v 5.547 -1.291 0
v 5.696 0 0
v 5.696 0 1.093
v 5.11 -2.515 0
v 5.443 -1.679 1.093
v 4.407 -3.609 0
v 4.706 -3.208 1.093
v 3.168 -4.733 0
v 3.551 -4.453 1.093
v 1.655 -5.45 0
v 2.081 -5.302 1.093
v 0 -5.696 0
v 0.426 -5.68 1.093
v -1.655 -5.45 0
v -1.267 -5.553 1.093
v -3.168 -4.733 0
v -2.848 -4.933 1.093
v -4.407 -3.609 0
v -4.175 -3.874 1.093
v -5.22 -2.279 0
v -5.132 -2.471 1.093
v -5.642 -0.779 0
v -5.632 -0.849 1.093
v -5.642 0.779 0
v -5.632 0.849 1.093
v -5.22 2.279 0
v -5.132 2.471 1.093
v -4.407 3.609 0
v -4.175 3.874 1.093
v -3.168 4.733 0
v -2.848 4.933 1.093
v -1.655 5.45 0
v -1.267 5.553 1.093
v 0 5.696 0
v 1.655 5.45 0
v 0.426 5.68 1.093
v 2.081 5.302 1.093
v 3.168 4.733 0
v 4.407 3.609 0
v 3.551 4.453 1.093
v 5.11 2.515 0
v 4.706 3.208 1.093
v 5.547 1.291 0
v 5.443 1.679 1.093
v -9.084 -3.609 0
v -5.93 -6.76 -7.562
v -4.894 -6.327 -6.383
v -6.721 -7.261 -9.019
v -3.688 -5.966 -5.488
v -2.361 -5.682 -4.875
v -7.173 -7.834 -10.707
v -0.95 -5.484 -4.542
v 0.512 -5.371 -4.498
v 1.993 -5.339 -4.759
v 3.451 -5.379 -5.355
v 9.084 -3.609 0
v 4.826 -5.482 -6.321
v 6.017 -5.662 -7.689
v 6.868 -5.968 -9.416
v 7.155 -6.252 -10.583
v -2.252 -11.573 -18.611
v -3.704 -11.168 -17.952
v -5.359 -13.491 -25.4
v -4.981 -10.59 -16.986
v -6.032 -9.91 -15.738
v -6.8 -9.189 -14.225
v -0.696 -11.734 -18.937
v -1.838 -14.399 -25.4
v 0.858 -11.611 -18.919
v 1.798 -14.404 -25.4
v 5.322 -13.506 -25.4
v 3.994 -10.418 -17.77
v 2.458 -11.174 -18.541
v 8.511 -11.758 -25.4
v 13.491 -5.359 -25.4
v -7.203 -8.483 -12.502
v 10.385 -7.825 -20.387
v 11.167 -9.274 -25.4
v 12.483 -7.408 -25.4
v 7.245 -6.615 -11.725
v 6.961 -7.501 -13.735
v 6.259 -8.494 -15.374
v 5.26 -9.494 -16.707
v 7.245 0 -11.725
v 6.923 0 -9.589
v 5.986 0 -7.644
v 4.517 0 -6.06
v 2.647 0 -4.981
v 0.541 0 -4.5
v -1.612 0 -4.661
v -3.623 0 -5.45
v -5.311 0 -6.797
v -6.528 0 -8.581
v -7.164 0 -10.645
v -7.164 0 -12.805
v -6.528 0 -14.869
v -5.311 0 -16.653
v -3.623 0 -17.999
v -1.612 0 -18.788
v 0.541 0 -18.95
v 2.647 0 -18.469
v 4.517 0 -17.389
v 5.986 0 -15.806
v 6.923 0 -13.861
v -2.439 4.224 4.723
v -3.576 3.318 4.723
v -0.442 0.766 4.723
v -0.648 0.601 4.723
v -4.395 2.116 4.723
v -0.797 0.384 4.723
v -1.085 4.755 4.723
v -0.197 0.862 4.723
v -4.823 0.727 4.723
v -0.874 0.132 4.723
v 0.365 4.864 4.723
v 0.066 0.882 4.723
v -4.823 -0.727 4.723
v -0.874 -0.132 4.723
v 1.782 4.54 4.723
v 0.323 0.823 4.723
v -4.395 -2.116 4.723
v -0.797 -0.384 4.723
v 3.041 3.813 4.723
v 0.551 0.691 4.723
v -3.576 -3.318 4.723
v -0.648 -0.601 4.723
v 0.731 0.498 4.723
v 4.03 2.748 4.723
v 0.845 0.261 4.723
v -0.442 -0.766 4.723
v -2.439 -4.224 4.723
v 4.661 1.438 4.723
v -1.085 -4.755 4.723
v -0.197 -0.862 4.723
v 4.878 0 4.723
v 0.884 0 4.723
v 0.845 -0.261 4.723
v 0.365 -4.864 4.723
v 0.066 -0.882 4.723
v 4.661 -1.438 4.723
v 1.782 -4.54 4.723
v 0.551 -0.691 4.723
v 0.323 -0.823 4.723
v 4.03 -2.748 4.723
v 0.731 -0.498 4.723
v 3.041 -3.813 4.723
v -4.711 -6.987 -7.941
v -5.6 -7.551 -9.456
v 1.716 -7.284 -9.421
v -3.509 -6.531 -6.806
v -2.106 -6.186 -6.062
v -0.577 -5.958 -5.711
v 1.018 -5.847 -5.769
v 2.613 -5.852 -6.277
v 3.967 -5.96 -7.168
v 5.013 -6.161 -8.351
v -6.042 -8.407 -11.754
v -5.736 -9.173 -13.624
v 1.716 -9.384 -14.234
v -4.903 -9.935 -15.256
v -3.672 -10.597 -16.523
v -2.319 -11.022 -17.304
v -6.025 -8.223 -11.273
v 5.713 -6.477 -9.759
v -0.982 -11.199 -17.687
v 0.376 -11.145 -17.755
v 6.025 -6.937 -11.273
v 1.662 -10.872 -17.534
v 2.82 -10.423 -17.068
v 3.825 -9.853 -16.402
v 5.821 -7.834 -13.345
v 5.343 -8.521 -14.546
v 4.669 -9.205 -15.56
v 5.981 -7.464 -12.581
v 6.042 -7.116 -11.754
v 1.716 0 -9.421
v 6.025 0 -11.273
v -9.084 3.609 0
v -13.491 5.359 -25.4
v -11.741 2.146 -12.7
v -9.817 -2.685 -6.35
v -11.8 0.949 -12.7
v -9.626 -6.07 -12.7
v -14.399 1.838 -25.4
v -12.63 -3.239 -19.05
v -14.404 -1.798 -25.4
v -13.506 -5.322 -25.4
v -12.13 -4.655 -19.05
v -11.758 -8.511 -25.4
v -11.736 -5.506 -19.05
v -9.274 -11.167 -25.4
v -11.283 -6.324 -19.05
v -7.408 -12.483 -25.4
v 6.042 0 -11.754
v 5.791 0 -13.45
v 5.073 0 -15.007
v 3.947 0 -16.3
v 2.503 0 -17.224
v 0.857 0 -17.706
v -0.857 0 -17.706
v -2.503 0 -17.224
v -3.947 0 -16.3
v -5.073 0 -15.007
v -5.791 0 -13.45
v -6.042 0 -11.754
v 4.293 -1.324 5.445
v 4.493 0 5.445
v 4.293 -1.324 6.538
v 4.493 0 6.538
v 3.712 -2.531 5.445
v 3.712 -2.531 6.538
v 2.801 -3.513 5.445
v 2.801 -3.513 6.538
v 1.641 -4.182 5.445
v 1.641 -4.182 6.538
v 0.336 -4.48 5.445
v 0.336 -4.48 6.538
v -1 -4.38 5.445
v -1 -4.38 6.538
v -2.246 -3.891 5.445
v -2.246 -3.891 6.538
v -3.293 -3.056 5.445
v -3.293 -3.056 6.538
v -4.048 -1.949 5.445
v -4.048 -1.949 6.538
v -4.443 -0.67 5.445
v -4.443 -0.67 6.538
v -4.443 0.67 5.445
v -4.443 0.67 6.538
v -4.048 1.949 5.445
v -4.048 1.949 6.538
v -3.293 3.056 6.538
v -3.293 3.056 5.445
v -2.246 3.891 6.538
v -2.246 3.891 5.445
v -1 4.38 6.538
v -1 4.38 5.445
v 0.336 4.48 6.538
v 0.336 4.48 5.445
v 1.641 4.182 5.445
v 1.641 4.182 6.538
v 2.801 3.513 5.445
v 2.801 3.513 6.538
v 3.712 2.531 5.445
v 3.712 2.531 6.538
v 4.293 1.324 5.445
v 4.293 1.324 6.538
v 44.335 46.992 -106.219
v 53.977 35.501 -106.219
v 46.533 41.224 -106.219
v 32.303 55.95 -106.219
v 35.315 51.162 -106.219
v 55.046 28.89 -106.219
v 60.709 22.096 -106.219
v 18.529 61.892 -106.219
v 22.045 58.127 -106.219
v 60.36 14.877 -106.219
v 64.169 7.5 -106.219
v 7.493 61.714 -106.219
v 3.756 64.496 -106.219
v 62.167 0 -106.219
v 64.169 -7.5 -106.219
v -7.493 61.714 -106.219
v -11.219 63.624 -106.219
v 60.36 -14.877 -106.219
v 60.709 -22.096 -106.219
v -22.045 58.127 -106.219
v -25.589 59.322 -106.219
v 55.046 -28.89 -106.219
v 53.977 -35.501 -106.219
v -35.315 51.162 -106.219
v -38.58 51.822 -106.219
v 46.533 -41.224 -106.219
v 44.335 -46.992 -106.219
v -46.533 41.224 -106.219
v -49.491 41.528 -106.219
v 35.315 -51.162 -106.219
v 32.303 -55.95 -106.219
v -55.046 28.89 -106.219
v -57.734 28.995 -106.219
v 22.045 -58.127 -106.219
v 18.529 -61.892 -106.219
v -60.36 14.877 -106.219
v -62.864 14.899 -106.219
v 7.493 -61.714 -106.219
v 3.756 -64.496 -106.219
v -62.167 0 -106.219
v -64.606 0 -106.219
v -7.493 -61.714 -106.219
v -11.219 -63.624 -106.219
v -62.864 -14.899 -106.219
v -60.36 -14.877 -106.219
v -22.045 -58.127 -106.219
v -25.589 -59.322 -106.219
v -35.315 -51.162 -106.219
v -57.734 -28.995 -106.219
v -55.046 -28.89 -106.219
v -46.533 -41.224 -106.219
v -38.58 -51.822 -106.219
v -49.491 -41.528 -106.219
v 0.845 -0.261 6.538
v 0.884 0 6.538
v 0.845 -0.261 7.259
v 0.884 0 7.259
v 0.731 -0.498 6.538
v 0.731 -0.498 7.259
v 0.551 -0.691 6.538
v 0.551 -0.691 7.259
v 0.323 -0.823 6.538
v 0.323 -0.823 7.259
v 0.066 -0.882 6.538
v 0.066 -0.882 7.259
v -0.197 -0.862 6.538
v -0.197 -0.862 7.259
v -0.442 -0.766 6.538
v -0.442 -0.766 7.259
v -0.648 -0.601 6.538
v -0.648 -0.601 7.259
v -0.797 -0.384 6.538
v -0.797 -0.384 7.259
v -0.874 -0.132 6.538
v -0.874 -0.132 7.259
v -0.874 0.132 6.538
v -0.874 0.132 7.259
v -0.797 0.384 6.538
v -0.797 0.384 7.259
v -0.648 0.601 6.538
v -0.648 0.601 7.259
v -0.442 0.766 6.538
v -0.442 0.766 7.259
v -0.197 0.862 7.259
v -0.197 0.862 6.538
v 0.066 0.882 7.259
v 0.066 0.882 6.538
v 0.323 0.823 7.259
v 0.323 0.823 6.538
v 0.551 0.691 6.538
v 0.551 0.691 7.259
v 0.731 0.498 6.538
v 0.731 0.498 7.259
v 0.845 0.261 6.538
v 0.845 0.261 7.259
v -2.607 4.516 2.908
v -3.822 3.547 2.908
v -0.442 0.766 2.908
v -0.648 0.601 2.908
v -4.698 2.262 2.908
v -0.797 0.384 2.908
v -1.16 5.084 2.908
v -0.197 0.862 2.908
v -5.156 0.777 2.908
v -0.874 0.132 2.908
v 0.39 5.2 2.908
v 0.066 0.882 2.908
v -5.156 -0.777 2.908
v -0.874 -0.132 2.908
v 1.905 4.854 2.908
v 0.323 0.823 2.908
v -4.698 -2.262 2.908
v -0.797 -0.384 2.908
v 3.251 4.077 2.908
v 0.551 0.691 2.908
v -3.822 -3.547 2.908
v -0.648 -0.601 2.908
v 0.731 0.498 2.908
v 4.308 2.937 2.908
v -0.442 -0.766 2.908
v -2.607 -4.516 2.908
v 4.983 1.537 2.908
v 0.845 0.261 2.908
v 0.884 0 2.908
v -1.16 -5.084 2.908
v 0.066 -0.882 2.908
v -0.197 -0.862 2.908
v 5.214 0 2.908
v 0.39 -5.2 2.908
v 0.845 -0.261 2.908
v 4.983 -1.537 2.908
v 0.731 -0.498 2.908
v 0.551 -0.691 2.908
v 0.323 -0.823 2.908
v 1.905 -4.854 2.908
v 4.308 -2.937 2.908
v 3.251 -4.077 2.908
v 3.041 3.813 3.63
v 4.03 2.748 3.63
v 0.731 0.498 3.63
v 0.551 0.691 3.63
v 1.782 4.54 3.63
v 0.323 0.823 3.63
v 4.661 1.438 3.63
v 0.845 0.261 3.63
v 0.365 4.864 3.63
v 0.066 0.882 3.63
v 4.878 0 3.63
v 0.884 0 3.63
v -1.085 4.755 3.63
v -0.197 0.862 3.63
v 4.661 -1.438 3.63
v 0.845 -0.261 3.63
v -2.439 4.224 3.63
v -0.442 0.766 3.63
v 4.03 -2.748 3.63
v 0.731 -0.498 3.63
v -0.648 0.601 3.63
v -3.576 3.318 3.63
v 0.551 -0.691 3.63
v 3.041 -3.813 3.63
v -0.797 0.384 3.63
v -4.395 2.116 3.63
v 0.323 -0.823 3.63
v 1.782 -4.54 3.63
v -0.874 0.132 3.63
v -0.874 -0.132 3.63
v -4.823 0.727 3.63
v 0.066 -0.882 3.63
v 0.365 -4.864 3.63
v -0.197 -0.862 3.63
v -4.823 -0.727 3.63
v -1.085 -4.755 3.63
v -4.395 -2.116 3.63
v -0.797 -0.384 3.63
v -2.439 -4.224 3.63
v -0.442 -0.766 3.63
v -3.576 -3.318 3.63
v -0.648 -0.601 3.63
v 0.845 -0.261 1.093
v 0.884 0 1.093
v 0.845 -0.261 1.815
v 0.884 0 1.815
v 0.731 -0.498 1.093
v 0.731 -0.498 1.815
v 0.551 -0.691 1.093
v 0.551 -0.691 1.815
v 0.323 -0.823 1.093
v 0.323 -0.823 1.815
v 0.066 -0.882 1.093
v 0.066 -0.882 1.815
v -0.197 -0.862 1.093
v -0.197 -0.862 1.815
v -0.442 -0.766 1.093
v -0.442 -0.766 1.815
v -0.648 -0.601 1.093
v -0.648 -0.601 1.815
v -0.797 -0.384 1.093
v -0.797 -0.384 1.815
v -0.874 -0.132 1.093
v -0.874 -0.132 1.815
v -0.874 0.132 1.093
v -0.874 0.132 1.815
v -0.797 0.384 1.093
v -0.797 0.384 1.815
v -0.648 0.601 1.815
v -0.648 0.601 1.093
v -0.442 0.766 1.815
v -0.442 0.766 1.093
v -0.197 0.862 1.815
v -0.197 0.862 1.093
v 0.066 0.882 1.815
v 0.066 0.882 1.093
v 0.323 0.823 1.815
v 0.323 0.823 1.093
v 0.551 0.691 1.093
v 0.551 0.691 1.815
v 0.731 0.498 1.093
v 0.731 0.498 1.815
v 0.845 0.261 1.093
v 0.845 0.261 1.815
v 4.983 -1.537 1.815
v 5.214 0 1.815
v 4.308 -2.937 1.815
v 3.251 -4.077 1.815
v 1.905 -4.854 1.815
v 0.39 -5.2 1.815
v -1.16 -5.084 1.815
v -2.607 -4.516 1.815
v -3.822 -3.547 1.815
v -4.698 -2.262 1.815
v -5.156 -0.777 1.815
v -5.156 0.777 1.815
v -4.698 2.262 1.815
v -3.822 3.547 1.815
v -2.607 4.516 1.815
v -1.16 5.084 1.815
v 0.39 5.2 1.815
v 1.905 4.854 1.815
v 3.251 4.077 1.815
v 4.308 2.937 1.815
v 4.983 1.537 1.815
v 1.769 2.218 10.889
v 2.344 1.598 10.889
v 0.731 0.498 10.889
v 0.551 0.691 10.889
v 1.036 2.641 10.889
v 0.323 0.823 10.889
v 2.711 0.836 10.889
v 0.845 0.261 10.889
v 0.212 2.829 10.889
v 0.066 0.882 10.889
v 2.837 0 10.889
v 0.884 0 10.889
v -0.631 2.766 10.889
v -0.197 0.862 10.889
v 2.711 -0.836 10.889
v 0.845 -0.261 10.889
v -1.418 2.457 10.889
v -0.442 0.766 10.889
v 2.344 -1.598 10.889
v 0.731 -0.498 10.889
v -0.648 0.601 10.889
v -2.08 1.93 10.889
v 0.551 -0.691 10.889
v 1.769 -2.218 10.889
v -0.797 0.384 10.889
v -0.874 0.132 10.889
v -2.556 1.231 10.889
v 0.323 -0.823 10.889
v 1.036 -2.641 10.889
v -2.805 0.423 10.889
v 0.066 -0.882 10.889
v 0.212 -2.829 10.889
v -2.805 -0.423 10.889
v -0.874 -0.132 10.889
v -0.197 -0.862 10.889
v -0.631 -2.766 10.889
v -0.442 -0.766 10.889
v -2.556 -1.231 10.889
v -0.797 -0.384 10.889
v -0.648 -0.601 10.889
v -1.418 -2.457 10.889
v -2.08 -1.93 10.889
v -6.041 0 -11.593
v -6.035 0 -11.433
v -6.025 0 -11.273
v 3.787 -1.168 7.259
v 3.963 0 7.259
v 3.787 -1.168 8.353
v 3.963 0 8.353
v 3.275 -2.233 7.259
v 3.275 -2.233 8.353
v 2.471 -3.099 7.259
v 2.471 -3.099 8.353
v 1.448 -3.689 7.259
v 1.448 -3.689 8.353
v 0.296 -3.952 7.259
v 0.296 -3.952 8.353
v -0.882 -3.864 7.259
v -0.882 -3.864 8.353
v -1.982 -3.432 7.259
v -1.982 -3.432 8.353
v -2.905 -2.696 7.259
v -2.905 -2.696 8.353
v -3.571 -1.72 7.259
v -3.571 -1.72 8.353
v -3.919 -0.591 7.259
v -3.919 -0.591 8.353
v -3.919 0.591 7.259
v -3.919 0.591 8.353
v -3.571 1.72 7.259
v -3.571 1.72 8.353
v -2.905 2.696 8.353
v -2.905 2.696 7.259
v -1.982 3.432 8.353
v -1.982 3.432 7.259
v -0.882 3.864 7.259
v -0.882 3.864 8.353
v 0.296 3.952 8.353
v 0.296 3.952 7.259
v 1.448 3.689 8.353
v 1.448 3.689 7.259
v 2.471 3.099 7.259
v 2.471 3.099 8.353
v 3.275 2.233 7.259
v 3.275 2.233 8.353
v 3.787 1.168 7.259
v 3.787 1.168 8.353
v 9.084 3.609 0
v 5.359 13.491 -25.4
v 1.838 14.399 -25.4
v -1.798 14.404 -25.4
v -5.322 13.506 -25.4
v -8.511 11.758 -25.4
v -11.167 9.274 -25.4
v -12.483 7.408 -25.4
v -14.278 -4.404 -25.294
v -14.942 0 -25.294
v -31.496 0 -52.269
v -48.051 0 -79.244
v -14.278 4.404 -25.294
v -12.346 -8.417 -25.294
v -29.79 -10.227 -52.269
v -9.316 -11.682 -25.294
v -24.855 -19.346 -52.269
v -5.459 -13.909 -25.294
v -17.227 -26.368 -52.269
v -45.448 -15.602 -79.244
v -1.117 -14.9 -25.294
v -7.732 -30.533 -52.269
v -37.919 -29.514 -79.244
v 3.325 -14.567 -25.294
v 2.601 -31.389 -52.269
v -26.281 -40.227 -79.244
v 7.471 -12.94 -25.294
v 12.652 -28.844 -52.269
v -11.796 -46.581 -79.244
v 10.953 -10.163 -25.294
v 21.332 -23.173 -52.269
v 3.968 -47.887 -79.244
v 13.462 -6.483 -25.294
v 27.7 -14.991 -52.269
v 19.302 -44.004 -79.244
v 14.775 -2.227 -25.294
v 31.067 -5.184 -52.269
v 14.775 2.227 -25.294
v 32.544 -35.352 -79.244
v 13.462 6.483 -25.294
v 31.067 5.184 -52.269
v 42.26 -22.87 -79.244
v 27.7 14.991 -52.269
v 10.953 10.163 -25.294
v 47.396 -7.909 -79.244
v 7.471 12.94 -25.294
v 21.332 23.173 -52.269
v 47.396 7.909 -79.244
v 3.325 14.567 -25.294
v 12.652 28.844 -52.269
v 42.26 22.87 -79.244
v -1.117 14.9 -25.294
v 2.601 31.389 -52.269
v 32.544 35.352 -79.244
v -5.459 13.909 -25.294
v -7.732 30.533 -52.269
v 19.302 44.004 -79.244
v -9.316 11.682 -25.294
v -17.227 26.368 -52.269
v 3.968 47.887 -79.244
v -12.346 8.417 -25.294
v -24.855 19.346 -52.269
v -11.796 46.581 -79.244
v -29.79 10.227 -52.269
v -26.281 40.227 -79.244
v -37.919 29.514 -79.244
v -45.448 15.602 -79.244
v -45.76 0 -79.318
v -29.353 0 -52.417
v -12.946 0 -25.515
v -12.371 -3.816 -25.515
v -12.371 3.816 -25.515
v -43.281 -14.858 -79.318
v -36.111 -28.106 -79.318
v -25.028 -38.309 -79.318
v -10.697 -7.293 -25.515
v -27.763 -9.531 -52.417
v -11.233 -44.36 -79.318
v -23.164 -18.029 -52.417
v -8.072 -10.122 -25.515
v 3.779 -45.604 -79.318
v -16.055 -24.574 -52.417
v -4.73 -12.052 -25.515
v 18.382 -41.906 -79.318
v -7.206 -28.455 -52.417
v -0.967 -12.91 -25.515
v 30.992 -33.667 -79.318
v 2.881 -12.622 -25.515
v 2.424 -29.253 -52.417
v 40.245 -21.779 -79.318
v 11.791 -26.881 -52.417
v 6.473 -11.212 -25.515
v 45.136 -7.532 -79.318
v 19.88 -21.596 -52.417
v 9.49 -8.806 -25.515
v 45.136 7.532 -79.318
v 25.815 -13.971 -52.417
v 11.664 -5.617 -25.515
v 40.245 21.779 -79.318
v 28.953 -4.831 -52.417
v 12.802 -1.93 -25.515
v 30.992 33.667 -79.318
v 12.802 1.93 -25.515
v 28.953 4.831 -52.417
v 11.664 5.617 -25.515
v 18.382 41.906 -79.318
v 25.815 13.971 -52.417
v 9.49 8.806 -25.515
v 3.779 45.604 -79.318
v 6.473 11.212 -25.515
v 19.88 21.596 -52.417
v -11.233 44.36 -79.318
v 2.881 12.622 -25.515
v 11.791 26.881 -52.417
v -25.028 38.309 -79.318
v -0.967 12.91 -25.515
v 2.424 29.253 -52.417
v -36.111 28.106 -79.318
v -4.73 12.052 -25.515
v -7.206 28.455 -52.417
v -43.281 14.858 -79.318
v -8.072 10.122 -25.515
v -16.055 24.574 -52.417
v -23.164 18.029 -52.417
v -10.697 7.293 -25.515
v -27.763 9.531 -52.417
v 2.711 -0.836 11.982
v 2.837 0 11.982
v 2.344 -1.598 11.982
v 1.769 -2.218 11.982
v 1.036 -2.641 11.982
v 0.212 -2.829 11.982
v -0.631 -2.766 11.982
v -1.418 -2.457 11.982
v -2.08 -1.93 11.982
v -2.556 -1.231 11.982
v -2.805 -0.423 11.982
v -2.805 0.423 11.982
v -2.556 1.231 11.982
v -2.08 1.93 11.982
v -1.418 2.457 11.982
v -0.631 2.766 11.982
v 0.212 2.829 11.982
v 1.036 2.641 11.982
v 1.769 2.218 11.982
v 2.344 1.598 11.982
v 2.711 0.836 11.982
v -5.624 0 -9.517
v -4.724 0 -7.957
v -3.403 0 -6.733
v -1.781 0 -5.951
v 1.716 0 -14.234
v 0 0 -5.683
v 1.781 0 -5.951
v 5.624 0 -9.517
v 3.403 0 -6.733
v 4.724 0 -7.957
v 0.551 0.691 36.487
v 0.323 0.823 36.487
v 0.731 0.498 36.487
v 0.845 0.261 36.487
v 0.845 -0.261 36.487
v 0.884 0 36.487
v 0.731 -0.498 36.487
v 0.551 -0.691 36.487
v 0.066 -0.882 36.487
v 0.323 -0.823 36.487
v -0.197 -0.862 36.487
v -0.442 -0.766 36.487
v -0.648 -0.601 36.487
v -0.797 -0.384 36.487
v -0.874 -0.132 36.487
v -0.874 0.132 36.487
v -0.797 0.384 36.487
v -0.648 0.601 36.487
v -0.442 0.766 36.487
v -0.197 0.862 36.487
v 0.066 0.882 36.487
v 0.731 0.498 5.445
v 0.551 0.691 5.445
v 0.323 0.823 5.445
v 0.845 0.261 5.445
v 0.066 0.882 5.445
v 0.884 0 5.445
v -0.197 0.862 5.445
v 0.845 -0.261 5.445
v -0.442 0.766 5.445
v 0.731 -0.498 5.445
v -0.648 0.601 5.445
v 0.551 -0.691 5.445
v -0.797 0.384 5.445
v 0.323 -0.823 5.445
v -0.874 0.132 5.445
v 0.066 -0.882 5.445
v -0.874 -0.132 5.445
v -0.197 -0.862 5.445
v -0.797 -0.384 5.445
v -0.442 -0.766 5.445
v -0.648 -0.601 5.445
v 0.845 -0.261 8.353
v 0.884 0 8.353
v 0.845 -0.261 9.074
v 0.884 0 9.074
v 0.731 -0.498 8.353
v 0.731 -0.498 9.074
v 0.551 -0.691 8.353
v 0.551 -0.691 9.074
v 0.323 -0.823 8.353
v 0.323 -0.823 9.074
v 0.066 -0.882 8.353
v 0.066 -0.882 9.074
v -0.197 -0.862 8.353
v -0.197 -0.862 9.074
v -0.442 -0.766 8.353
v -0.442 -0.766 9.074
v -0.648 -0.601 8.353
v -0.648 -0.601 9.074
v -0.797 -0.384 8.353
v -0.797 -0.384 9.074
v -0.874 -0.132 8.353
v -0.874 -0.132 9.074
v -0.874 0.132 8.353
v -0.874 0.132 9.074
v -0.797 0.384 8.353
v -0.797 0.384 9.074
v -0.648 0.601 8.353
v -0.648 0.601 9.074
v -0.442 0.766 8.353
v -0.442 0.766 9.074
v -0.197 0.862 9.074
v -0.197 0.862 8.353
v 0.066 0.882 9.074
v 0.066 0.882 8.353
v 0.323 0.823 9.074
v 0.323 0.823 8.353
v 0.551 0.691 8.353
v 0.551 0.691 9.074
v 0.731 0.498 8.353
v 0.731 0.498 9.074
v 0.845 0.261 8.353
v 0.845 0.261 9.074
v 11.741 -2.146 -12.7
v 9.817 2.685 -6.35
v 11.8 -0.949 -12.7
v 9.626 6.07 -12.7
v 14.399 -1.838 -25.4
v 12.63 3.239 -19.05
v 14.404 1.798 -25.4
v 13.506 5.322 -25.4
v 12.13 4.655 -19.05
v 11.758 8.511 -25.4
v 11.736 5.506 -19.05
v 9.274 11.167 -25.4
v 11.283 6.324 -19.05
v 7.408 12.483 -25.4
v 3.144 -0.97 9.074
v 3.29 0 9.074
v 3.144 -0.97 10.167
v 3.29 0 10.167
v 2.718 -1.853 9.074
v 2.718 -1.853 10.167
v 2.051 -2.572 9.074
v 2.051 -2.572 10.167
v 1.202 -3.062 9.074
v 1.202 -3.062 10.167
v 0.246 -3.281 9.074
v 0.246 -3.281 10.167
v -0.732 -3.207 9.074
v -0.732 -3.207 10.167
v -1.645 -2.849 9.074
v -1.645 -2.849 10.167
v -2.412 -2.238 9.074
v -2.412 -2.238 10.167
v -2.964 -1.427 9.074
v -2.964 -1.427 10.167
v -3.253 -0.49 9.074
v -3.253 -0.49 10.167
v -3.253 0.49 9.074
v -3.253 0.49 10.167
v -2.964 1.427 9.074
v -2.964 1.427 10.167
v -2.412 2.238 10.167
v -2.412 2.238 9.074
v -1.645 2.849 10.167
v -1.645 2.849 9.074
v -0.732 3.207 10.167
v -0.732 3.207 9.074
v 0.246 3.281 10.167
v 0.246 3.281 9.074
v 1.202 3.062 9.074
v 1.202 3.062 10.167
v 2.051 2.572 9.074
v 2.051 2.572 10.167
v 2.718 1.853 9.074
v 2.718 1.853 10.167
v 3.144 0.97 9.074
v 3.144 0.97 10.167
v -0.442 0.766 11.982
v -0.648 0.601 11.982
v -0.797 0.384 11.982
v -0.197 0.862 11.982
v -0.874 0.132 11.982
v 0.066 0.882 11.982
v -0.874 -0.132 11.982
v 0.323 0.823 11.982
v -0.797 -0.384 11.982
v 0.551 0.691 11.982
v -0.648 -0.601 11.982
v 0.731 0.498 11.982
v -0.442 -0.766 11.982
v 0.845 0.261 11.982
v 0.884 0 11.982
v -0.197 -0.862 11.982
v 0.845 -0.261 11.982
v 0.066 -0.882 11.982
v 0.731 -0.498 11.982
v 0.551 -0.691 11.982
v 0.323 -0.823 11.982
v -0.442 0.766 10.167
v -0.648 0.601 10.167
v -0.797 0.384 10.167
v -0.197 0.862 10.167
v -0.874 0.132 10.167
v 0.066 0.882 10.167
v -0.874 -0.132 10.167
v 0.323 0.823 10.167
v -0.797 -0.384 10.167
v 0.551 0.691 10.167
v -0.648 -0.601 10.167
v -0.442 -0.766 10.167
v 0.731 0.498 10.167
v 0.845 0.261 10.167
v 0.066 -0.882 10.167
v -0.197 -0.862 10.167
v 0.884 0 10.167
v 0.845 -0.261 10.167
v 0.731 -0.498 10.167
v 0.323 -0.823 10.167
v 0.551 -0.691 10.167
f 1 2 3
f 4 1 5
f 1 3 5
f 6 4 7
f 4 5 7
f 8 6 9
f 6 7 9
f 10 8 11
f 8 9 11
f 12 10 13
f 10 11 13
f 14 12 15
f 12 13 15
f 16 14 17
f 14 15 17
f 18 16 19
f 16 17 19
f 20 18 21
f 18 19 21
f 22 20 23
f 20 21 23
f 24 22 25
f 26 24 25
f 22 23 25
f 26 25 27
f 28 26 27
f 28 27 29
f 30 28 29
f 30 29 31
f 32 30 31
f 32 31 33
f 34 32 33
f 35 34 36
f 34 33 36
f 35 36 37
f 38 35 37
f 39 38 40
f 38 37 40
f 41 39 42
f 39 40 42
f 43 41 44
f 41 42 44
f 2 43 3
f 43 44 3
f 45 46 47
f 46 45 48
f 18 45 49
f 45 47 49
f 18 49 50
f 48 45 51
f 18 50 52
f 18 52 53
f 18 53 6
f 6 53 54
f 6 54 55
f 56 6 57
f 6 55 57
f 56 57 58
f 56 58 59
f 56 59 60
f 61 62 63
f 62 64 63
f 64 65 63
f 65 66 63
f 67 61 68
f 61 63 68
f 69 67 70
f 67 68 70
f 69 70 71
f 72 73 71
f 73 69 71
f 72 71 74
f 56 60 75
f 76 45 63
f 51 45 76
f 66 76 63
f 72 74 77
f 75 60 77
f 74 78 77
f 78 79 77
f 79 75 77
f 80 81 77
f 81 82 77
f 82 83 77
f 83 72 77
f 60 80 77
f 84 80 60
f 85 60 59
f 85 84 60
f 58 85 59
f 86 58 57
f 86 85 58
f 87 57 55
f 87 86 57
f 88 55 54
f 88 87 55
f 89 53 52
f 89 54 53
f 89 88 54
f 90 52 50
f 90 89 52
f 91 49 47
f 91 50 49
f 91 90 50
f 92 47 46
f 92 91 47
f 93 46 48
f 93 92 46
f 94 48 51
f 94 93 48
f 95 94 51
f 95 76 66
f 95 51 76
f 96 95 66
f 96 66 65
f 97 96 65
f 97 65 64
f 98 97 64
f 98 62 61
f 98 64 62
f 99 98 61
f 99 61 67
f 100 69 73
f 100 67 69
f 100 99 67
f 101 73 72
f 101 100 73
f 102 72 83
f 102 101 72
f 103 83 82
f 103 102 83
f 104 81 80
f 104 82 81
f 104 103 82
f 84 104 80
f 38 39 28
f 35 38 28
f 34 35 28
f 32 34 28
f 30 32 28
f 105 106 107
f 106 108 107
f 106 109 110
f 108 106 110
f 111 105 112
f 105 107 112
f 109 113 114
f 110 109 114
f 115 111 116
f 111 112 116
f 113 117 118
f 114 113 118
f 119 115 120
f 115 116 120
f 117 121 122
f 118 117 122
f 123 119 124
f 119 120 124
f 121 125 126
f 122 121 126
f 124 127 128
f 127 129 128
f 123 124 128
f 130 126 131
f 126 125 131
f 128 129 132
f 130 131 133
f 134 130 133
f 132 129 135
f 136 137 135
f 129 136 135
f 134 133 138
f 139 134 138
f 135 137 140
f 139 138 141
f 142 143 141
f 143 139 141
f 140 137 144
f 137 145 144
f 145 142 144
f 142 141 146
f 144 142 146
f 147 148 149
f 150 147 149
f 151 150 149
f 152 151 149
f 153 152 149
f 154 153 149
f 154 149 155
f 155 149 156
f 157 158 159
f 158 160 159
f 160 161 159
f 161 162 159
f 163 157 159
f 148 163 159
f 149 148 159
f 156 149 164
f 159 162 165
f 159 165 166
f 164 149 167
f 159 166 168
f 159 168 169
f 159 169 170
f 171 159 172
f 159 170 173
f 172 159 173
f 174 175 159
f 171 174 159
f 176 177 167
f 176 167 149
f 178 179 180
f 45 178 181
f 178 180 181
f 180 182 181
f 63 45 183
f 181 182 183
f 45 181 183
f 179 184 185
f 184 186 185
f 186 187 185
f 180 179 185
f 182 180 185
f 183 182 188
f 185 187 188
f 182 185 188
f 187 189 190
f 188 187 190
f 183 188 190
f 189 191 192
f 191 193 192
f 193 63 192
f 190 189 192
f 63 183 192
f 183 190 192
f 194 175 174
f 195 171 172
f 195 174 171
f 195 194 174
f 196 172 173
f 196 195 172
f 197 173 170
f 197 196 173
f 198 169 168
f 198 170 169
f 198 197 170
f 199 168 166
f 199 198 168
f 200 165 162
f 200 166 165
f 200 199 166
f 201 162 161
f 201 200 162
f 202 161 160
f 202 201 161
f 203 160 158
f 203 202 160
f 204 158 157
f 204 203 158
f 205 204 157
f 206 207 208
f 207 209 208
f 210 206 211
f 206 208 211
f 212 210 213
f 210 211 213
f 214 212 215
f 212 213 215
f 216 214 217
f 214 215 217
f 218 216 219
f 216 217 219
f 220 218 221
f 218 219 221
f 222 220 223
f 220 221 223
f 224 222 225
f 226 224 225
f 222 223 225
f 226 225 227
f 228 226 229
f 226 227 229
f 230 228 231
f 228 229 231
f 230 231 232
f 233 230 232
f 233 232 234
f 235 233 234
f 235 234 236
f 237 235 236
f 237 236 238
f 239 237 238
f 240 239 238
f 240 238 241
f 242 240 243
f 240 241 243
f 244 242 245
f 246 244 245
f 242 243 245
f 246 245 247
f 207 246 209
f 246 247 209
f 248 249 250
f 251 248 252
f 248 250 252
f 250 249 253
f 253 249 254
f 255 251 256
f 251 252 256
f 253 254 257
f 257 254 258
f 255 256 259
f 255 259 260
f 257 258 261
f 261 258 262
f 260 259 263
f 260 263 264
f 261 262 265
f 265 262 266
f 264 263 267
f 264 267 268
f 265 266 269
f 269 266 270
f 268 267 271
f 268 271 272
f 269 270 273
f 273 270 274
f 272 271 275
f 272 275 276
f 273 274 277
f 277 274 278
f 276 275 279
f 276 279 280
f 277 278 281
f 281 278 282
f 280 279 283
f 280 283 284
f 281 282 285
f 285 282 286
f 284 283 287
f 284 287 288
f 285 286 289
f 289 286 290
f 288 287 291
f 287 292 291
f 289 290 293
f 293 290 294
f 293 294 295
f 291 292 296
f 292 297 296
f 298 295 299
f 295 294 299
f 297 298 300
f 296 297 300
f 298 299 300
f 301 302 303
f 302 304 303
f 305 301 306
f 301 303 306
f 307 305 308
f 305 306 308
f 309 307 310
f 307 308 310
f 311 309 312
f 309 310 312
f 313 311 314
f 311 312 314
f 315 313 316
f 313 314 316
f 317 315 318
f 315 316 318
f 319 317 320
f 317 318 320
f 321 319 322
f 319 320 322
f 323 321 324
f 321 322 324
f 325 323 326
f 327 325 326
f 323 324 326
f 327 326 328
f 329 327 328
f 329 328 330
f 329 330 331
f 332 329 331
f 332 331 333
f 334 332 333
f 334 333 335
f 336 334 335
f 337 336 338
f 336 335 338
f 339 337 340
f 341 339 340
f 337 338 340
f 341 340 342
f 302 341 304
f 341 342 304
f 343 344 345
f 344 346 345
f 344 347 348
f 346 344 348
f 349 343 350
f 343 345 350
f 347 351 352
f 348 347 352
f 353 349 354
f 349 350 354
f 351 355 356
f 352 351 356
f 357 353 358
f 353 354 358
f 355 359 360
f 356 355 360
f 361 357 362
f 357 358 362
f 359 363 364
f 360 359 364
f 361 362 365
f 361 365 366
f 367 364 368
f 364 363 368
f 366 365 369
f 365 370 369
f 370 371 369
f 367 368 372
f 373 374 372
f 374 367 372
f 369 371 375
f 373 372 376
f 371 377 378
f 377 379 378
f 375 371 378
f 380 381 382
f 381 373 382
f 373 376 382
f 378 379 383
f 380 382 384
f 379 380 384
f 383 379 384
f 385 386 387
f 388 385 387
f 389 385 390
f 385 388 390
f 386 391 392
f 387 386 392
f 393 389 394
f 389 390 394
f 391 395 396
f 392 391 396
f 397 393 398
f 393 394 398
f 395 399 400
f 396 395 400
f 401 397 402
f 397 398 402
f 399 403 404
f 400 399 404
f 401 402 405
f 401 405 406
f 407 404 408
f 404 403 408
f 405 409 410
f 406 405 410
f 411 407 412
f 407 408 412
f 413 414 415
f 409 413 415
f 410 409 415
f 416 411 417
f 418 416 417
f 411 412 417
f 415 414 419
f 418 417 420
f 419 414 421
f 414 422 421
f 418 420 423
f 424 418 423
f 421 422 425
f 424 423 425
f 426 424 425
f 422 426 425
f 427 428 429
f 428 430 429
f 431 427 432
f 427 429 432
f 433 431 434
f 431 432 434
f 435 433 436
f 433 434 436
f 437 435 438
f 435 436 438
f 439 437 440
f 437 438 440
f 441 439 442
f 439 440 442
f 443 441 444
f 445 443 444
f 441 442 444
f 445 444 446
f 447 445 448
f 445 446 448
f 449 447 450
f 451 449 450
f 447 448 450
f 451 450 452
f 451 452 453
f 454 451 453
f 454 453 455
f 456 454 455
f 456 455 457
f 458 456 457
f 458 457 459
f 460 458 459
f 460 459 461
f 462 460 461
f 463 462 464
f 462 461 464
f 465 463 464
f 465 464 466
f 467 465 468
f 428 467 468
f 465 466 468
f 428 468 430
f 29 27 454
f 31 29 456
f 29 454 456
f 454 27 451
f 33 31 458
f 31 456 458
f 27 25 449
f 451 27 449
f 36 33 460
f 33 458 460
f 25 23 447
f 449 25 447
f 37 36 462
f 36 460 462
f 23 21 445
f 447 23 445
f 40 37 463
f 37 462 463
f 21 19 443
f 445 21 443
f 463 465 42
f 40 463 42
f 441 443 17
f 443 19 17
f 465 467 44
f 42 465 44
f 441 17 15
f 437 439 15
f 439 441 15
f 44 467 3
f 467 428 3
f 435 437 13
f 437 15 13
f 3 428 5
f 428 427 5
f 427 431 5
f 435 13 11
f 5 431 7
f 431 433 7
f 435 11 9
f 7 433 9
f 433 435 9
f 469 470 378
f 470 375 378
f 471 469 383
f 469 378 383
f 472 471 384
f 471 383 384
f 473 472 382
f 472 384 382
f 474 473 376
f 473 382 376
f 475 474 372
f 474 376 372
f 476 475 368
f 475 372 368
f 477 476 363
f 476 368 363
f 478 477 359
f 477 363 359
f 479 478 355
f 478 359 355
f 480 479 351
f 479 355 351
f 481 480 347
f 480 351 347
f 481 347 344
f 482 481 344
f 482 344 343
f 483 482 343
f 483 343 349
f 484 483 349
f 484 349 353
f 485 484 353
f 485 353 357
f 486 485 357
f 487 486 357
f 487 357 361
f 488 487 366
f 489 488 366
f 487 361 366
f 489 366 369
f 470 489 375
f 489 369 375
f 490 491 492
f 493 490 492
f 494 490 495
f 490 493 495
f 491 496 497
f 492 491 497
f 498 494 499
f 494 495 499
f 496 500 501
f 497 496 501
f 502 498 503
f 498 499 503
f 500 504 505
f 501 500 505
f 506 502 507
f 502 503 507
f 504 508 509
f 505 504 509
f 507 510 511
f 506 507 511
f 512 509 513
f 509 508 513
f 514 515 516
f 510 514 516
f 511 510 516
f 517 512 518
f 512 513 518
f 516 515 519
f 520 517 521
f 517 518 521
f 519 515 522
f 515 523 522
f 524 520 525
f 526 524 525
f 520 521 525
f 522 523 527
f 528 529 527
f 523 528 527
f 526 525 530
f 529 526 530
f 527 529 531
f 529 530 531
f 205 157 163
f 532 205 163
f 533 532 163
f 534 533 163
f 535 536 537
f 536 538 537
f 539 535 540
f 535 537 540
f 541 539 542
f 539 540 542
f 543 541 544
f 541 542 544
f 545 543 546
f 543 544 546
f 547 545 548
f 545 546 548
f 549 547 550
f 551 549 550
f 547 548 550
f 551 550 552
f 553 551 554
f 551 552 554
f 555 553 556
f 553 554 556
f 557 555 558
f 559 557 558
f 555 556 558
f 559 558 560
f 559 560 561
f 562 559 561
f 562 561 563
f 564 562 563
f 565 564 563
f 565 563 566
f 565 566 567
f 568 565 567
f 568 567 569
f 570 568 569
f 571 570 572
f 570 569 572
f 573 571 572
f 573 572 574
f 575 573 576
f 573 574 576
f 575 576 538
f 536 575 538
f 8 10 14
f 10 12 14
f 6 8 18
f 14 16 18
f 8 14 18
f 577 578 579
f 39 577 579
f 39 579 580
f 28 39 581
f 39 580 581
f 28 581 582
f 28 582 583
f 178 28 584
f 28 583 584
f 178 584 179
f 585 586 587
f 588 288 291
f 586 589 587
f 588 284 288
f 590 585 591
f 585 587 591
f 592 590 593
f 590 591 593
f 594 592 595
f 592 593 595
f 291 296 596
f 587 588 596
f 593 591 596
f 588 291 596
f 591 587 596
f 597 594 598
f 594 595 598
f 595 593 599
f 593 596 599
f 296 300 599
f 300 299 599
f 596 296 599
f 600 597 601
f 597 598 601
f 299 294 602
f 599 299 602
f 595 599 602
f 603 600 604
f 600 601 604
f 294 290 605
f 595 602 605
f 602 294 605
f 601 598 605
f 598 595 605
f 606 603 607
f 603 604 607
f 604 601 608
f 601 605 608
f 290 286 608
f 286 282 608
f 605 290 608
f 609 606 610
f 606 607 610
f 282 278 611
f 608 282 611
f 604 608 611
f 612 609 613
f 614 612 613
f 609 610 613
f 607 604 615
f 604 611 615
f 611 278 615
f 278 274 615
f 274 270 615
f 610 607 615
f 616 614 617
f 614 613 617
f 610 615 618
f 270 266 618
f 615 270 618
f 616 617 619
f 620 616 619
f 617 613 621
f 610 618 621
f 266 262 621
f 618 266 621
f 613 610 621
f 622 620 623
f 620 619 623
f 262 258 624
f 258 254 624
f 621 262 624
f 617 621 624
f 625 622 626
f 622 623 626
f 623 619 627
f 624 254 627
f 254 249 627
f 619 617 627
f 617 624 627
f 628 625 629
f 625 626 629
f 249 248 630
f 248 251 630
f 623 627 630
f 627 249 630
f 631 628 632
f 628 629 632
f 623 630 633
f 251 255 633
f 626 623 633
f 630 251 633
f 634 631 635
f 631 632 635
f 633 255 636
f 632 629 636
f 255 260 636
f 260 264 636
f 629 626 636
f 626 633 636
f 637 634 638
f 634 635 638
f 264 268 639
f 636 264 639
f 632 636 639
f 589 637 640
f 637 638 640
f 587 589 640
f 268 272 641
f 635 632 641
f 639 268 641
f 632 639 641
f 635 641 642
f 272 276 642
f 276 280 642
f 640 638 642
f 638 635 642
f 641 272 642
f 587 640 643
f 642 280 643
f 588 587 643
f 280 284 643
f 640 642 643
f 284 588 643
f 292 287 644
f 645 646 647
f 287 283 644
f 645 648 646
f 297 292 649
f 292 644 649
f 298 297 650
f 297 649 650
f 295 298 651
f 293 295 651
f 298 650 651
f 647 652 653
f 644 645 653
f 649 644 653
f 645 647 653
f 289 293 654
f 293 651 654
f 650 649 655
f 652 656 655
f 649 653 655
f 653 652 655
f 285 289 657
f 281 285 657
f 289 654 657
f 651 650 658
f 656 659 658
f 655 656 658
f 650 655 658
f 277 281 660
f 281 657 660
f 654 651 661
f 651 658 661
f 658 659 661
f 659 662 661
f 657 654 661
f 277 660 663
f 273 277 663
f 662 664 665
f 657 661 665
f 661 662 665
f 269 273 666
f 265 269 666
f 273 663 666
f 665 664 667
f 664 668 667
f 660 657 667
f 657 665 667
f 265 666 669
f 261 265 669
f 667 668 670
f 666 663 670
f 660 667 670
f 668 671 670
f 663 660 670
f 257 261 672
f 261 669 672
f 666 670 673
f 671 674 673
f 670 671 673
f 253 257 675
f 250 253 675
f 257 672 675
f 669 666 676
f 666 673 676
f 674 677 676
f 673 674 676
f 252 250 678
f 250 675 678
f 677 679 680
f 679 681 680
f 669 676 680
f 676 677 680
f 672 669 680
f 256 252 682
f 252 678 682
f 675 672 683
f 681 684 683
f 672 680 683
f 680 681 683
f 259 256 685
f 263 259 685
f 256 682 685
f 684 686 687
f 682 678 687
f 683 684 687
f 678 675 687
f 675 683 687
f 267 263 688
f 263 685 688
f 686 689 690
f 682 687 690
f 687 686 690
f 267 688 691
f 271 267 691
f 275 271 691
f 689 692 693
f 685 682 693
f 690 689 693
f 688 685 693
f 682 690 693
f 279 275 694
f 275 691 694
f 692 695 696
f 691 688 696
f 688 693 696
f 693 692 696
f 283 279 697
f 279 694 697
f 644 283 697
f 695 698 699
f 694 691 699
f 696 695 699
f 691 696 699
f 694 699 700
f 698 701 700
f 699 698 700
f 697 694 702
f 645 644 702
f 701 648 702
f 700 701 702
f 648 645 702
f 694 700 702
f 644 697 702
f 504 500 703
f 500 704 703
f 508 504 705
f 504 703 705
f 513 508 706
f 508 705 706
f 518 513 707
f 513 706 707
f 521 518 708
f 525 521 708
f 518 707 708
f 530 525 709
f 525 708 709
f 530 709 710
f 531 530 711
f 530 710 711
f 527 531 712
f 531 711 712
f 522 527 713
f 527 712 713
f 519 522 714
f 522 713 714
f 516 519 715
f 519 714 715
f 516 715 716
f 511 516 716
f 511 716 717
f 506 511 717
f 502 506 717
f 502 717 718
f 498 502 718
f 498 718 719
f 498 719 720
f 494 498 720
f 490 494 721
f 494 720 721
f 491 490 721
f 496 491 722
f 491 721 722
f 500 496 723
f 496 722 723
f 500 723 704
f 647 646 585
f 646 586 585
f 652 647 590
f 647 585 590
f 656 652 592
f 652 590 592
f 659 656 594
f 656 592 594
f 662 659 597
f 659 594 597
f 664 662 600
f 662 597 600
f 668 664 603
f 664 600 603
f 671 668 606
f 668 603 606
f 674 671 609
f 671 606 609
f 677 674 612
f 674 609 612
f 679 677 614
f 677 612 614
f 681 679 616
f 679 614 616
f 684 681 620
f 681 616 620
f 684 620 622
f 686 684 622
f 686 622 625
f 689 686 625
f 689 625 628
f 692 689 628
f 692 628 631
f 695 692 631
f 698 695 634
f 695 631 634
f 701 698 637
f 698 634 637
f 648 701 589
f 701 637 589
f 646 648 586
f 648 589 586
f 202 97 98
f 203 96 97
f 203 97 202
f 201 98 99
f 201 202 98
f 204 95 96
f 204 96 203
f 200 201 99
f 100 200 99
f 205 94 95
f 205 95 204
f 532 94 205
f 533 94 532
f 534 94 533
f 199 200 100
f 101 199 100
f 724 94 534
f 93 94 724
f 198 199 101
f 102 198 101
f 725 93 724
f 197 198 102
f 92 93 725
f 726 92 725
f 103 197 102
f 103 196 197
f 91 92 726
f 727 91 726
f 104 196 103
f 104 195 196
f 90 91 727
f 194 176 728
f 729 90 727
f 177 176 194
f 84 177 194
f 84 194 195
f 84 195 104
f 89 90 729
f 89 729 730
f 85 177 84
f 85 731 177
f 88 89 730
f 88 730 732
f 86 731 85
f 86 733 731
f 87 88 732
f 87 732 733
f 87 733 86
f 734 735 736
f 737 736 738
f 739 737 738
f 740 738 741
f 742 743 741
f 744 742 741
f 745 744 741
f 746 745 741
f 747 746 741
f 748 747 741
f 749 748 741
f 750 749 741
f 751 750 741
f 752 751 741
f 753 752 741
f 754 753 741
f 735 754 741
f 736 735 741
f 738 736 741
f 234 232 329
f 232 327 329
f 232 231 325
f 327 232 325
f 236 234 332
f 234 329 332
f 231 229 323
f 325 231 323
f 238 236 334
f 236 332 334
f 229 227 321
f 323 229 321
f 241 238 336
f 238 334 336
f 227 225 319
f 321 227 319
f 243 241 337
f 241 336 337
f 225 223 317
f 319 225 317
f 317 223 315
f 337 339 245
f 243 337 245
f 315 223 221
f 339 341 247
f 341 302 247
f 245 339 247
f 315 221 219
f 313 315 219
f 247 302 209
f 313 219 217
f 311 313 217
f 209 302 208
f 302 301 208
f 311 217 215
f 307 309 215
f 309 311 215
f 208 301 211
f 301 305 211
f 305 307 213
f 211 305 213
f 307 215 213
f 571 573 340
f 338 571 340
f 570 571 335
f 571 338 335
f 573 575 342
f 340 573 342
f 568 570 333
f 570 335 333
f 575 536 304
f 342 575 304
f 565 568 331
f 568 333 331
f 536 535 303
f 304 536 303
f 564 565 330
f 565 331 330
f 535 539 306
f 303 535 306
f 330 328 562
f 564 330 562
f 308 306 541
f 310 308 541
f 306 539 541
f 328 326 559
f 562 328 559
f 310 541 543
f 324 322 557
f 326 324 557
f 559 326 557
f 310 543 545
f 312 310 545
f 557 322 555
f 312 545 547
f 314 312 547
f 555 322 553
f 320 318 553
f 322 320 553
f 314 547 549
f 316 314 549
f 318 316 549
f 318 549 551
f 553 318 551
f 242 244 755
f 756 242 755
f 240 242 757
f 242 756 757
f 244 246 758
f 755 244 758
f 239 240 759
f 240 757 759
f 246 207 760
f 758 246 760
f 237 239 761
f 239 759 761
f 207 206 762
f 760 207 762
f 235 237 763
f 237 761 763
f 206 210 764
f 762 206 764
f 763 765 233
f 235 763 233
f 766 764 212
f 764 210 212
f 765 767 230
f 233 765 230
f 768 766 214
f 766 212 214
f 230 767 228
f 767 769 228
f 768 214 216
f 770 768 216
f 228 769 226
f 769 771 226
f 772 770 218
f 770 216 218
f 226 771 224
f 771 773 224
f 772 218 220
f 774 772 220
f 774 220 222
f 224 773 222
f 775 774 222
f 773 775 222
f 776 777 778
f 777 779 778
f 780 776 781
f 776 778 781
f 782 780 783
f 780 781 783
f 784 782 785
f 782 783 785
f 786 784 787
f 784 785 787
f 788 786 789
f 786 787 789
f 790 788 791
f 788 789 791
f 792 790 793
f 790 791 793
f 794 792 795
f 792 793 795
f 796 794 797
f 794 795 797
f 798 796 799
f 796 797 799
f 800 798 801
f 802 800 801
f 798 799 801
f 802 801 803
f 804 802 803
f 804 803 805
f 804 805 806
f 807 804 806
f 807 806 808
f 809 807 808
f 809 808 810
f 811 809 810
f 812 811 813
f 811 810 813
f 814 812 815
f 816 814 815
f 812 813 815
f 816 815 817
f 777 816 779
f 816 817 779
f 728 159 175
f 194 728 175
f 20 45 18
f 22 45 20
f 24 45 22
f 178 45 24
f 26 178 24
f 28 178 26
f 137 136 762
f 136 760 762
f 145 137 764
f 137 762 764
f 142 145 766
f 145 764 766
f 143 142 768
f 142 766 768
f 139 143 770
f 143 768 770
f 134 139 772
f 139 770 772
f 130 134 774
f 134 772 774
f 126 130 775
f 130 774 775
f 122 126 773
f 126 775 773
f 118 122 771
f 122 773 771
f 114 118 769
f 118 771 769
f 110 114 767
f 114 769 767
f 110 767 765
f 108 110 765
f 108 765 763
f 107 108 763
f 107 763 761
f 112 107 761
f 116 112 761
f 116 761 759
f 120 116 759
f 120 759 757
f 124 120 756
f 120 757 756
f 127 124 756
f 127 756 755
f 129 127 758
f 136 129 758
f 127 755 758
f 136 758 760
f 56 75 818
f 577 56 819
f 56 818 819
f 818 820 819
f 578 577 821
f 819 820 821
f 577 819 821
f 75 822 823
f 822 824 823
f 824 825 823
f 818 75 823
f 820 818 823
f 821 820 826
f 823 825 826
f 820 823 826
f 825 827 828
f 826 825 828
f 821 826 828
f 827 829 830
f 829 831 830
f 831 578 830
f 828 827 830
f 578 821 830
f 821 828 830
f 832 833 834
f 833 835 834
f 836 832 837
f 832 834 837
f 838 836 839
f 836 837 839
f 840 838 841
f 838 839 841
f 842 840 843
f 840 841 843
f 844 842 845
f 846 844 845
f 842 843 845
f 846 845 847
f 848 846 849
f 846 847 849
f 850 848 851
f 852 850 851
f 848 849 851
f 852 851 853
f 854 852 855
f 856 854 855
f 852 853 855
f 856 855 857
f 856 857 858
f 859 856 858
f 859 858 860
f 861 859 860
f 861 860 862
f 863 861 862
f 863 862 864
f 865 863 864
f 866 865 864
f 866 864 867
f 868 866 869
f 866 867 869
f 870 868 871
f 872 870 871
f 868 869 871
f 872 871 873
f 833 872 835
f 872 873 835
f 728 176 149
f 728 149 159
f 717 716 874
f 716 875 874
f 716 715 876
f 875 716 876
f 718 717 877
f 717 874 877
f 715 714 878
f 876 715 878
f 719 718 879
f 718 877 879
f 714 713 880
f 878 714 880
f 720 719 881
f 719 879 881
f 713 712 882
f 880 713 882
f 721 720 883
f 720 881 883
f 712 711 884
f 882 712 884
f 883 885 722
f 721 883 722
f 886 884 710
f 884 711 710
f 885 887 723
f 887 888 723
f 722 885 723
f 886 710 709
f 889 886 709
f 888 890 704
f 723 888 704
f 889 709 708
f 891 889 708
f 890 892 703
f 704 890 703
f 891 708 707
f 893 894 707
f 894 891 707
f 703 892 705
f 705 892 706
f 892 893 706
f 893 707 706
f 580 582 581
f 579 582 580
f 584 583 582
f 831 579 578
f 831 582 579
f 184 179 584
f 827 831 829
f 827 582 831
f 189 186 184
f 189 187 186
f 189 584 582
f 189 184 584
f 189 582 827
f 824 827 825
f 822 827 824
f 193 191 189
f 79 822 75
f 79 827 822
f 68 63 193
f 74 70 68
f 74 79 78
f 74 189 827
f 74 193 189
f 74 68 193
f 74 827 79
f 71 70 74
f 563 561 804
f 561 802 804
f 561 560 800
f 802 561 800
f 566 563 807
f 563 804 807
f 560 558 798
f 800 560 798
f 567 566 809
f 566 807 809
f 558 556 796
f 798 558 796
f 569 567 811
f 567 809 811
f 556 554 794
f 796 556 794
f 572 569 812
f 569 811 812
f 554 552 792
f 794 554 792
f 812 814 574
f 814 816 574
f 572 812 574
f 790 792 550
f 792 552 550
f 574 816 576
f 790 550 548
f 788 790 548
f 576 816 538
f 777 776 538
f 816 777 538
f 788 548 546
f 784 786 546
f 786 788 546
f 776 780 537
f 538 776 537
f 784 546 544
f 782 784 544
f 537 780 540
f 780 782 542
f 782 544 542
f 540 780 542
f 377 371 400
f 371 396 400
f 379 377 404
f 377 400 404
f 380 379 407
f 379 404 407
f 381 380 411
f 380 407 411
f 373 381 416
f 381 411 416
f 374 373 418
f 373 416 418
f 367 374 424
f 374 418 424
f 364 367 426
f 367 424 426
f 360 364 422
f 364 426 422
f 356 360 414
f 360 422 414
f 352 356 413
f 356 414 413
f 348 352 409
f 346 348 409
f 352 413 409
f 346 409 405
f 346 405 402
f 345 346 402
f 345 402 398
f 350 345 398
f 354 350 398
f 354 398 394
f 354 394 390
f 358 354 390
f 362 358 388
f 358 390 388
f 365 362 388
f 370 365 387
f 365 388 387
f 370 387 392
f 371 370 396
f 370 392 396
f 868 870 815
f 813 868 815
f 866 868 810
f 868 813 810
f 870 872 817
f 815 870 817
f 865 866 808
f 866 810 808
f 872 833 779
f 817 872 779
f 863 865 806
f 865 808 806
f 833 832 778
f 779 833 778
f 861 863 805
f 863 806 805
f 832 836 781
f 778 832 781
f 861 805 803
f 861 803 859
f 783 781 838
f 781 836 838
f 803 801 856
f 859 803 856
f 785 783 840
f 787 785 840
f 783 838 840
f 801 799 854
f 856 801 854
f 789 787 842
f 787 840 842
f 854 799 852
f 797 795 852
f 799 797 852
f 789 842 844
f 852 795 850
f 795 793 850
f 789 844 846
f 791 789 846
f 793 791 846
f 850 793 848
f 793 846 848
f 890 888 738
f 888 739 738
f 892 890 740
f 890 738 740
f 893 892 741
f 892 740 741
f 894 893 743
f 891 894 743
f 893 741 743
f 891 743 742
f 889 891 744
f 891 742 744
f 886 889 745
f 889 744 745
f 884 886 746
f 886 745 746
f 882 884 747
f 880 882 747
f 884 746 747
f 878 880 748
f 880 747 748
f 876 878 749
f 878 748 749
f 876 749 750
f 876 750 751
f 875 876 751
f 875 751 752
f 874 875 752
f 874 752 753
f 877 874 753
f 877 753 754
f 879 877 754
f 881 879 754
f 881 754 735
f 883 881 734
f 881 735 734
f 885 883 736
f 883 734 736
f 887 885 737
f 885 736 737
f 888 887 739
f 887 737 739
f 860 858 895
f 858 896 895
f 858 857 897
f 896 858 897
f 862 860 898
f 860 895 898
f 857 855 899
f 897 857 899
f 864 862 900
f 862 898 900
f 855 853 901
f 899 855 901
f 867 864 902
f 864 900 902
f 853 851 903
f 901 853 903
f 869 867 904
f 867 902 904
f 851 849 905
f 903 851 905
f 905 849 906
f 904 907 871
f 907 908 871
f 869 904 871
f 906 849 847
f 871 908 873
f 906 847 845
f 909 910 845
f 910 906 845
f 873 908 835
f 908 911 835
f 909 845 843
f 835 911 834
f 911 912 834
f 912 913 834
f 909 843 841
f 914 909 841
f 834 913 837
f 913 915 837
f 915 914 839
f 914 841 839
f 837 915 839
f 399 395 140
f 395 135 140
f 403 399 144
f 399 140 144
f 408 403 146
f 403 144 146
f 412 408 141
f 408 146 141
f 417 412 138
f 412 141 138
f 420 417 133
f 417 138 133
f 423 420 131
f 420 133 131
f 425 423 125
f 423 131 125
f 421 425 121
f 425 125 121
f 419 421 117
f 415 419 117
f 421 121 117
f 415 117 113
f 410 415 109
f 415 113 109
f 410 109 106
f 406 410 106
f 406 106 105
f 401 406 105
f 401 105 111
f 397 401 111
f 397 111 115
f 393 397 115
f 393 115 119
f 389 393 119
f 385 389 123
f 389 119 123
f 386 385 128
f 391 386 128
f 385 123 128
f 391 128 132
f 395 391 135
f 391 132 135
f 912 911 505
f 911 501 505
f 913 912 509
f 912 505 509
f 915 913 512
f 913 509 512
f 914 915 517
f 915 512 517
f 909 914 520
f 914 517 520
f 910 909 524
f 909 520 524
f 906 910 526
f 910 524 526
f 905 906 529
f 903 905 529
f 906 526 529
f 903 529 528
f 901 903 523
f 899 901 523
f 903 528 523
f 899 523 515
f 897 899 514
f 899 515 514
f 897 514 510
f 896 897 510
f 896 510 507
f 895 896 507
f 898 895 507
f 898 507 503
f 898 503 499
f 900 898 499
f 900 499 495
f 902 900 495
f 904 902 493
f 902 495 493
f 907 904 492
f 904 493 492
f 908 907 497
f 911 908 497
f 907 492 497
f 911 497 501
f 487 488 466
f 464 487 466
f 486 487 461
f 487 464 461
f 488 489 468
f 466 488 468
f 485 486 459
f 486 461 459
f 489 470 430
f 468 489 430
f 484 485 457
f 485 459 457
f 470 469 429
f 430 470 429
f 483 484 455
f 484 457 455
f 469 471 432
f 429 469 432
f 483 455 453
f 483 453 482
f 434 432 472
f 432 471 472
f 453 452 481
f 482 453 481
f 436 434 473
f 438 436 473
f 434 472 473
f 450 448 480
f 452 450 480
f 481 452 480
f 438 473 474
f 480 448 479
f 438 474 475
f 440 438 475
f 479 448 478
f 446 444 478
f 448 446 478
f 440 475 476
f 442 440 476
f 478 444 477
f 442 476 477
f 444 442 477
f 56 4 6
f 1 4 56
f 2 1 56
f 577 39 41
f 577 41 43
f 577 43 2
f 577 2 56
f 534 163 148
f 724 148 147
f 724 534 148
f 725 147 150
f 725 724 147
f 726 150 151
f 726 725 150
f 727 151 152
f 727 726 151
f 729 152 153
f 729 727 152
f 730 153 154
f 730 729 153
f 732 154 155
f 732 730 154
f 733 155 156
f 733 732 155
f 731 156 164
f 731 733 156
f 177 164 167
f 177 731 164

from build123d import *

# Parameters (mm, degrees)
F0_W     = 18.1671218015
F0_H     = 7.2170761414
F8_R     = 7.2452056649
F9_DEPTH = 12.7


# Not quite as in the source:
# - the arcs of a loft's sections are written as splines that run evenly, so that the points pair up as in the source's solid


with BuildPart() as f3:
    # F0 (on Top) → F3 section 0
    with BuildSketch(Plane.XY):
        Rectangle(F0_W, F0_H)
    # F2 (on offset) → F3 section 1
    with BuildSketch(Plane.XY.offset(-25.4)):
        with BuildLine():
            add(Edge.make_bspline(
                [(-13.4909534727, 5.359420138), (-14.1924999283, 3.593458458), (-14.5426369472, 1.6887002477), (-14.4873172157, -2.1113118661), (-14.0818822313, -4.0050706272), (-12.5765717848, -7.4946540977), (-11.4772885982, -9.0891058051), (-8.7511573067, -11.7370031821), (-7.125381818, -12.7894070172), (-5.359420138, -13.4909534727)],
                knots=[0, 0, 0, 0, 0.25, 0.25, 0.5, 0.5, 0.75, 0.75, 1, 1, 1, 1], degree=3))
            add(Edge.make_bspline(
                [(-5.359420138, -13.4909534727), (-3.593458458, -14.1924999283), (-1.6887002477, -14.5426369472), (2.1113118661, -14.4873172157), (4.0050706272, -14.0818822313), (7.4946540977, -12.5765717848), (9.0891058051, -11.4772885982), (11.7370031821, -8.7511573067), (12.7894070172, -7.125381818), (13.4909534727, -5.359420138)],
                knots=[0, 0, 0, 0, 0.25, 0.25, 0.5, 0.5, 0.75, 0.75, 1, 1, 1, 1], degree=3))
            add(Edge.make_bspline(
                [(13.4909534727, -5.359420138), (14.1924999283, -3.593458458), (14.5426369472, -1.6887002477), (14.4873172157, 2.1113118661), (14.0818822313, 4.0050706272), (12.5765717848, 7.4946540977), (11.4772885982, 9.0891058051), (8.7511573067, 11.7370031821), (7.125381818, 12.7894070172), (5.359420138, 13.4909534727)],
                knots=[0, 0, 0, 0, 0.25, 0.25, 0.5, 0.5, 0.75, 0.75, 1, 1, 1, 1], degree=3))
            add(Edge.make_bspline(
                [(5.359420138, 13.4909534727), (3.593458458, 14.1924999283), (1.6887002477, 14.5426369472), (-2.1113118661, 14.4873172157), (-4.0050706272, 14.0818822313), (-7.4946540977, 12.5765717848), (-9.0891058051, 11.4772885982), (-11.7370031821, 8.7511573067), (-12.7894070172, 7.125381818), (-13.4909534727, 5.359420138)],
                knots=[0, 0, 0, 0, 0.25, 0.25, 0.5, 0.5, 0.75, 0.75, 1, 1, 1, 1], degree=3))
        make_face()
    loft(ruled=True)

    # F6 (on Front) → F7 (revolve)
    with BuildSketch(Plane.XZ):
        Polygon((0.8841773961, 36.48737818), (0, 36.48737818), (0, -4.7170827165), (1.1227278737, -4.7170827165), (2.8959631454, -0.8159647114), (0.8841773961, -0.8159647114), (0.8841773961, 0), (5.6955757318, 0), (5.6955757318, 1.0931361467), (0.8841773961, 1.0931361467), (0.8841773961, 1.8148457166), (5.2144367946, 1.8148457166), (5.2144367946, 2.9079818632), (0.8841773961, 2.9079818632), (0.8841773961, 3.6296914332), (4.8776374315, 3.6296914332), (4.8776374315, 4.7228275798), (0.8841773961, 4.7228275798), (0.8841773961, 5.4445371497), (4.4927265262, 5.4445371497), (4.4927265262, 6.5376732964), (0.8841773961, 6.5376732964), (0.8841773961, 7.2593828663), (3.9634722052, 7.2593828663), (3.9634722052, 8.352519013), (0.8841773961, 8.352519013), (0.8841773961, 9.0742285829), (3.2898765639, 9.0742285829), (3.2898765639, 10.1673647296), (0.8841773961, 10.1673647296), (0.8841773961, 10.8890742995), (2.8368307394, 10.8890742995), (2.8368307394, 11.9822104461), (0.8841773961, 11.9822104461), align=None)
    revolve(axis=Axis((0, 0, 24.3908111006), (0, 0, -1)))

    # F8 (on Front) → F9 (cut)
    with BuildSketch(Plane.XZ):
        with Locations((0, -11.7249386385)):
            Circle(F8_R)
        with BuildLine():
            ThreePointArc((6.0419317468, -11.7540457542), (0, -17.7669404969), (-6.0419317468, -11.7540457542))
            ThreePointArc((-6.0419317468, -11.7540457542), (-6.0382916863, -11.5132313675), (-6.0250572559, -11.2727533669))
            ThreePointArc((-6.0250572559, -11.2727533669), (0, -5.6829367801), (6.0250572559, -11.2727533669))
            Line((6.0250572559, -11.2727533669), (1.7158846604, -9.4208233058))
            Line((1.7158846604, -9.4208233058), (1.7158846604, -14.2336934805))
            Line((1.7158846604, -14.2336934805), (6.0419317468, -11.7540457542))
        make_face(mode=Mode.SUBTRACT)
    extrude(amount=F9_DEPTH, mode=Mode.SUBTRACT)


with BuildPart() as f5:
    # F4 (on Front) → F5 (revolve)
    with BuildSketch(Plane.XZ):
        Polygon((-12.9464622587, -25.5154054612), (-14.9418804795, -25.2936929464), (-64.6056458354, -106.2190234661), (-62.1668025851, -106.2190234661), align=None)
    revolve(axis=Axis((0, 0, -68.527775351), (0, 0, 1)))


solid = Compound([f3.part, f5.part])
